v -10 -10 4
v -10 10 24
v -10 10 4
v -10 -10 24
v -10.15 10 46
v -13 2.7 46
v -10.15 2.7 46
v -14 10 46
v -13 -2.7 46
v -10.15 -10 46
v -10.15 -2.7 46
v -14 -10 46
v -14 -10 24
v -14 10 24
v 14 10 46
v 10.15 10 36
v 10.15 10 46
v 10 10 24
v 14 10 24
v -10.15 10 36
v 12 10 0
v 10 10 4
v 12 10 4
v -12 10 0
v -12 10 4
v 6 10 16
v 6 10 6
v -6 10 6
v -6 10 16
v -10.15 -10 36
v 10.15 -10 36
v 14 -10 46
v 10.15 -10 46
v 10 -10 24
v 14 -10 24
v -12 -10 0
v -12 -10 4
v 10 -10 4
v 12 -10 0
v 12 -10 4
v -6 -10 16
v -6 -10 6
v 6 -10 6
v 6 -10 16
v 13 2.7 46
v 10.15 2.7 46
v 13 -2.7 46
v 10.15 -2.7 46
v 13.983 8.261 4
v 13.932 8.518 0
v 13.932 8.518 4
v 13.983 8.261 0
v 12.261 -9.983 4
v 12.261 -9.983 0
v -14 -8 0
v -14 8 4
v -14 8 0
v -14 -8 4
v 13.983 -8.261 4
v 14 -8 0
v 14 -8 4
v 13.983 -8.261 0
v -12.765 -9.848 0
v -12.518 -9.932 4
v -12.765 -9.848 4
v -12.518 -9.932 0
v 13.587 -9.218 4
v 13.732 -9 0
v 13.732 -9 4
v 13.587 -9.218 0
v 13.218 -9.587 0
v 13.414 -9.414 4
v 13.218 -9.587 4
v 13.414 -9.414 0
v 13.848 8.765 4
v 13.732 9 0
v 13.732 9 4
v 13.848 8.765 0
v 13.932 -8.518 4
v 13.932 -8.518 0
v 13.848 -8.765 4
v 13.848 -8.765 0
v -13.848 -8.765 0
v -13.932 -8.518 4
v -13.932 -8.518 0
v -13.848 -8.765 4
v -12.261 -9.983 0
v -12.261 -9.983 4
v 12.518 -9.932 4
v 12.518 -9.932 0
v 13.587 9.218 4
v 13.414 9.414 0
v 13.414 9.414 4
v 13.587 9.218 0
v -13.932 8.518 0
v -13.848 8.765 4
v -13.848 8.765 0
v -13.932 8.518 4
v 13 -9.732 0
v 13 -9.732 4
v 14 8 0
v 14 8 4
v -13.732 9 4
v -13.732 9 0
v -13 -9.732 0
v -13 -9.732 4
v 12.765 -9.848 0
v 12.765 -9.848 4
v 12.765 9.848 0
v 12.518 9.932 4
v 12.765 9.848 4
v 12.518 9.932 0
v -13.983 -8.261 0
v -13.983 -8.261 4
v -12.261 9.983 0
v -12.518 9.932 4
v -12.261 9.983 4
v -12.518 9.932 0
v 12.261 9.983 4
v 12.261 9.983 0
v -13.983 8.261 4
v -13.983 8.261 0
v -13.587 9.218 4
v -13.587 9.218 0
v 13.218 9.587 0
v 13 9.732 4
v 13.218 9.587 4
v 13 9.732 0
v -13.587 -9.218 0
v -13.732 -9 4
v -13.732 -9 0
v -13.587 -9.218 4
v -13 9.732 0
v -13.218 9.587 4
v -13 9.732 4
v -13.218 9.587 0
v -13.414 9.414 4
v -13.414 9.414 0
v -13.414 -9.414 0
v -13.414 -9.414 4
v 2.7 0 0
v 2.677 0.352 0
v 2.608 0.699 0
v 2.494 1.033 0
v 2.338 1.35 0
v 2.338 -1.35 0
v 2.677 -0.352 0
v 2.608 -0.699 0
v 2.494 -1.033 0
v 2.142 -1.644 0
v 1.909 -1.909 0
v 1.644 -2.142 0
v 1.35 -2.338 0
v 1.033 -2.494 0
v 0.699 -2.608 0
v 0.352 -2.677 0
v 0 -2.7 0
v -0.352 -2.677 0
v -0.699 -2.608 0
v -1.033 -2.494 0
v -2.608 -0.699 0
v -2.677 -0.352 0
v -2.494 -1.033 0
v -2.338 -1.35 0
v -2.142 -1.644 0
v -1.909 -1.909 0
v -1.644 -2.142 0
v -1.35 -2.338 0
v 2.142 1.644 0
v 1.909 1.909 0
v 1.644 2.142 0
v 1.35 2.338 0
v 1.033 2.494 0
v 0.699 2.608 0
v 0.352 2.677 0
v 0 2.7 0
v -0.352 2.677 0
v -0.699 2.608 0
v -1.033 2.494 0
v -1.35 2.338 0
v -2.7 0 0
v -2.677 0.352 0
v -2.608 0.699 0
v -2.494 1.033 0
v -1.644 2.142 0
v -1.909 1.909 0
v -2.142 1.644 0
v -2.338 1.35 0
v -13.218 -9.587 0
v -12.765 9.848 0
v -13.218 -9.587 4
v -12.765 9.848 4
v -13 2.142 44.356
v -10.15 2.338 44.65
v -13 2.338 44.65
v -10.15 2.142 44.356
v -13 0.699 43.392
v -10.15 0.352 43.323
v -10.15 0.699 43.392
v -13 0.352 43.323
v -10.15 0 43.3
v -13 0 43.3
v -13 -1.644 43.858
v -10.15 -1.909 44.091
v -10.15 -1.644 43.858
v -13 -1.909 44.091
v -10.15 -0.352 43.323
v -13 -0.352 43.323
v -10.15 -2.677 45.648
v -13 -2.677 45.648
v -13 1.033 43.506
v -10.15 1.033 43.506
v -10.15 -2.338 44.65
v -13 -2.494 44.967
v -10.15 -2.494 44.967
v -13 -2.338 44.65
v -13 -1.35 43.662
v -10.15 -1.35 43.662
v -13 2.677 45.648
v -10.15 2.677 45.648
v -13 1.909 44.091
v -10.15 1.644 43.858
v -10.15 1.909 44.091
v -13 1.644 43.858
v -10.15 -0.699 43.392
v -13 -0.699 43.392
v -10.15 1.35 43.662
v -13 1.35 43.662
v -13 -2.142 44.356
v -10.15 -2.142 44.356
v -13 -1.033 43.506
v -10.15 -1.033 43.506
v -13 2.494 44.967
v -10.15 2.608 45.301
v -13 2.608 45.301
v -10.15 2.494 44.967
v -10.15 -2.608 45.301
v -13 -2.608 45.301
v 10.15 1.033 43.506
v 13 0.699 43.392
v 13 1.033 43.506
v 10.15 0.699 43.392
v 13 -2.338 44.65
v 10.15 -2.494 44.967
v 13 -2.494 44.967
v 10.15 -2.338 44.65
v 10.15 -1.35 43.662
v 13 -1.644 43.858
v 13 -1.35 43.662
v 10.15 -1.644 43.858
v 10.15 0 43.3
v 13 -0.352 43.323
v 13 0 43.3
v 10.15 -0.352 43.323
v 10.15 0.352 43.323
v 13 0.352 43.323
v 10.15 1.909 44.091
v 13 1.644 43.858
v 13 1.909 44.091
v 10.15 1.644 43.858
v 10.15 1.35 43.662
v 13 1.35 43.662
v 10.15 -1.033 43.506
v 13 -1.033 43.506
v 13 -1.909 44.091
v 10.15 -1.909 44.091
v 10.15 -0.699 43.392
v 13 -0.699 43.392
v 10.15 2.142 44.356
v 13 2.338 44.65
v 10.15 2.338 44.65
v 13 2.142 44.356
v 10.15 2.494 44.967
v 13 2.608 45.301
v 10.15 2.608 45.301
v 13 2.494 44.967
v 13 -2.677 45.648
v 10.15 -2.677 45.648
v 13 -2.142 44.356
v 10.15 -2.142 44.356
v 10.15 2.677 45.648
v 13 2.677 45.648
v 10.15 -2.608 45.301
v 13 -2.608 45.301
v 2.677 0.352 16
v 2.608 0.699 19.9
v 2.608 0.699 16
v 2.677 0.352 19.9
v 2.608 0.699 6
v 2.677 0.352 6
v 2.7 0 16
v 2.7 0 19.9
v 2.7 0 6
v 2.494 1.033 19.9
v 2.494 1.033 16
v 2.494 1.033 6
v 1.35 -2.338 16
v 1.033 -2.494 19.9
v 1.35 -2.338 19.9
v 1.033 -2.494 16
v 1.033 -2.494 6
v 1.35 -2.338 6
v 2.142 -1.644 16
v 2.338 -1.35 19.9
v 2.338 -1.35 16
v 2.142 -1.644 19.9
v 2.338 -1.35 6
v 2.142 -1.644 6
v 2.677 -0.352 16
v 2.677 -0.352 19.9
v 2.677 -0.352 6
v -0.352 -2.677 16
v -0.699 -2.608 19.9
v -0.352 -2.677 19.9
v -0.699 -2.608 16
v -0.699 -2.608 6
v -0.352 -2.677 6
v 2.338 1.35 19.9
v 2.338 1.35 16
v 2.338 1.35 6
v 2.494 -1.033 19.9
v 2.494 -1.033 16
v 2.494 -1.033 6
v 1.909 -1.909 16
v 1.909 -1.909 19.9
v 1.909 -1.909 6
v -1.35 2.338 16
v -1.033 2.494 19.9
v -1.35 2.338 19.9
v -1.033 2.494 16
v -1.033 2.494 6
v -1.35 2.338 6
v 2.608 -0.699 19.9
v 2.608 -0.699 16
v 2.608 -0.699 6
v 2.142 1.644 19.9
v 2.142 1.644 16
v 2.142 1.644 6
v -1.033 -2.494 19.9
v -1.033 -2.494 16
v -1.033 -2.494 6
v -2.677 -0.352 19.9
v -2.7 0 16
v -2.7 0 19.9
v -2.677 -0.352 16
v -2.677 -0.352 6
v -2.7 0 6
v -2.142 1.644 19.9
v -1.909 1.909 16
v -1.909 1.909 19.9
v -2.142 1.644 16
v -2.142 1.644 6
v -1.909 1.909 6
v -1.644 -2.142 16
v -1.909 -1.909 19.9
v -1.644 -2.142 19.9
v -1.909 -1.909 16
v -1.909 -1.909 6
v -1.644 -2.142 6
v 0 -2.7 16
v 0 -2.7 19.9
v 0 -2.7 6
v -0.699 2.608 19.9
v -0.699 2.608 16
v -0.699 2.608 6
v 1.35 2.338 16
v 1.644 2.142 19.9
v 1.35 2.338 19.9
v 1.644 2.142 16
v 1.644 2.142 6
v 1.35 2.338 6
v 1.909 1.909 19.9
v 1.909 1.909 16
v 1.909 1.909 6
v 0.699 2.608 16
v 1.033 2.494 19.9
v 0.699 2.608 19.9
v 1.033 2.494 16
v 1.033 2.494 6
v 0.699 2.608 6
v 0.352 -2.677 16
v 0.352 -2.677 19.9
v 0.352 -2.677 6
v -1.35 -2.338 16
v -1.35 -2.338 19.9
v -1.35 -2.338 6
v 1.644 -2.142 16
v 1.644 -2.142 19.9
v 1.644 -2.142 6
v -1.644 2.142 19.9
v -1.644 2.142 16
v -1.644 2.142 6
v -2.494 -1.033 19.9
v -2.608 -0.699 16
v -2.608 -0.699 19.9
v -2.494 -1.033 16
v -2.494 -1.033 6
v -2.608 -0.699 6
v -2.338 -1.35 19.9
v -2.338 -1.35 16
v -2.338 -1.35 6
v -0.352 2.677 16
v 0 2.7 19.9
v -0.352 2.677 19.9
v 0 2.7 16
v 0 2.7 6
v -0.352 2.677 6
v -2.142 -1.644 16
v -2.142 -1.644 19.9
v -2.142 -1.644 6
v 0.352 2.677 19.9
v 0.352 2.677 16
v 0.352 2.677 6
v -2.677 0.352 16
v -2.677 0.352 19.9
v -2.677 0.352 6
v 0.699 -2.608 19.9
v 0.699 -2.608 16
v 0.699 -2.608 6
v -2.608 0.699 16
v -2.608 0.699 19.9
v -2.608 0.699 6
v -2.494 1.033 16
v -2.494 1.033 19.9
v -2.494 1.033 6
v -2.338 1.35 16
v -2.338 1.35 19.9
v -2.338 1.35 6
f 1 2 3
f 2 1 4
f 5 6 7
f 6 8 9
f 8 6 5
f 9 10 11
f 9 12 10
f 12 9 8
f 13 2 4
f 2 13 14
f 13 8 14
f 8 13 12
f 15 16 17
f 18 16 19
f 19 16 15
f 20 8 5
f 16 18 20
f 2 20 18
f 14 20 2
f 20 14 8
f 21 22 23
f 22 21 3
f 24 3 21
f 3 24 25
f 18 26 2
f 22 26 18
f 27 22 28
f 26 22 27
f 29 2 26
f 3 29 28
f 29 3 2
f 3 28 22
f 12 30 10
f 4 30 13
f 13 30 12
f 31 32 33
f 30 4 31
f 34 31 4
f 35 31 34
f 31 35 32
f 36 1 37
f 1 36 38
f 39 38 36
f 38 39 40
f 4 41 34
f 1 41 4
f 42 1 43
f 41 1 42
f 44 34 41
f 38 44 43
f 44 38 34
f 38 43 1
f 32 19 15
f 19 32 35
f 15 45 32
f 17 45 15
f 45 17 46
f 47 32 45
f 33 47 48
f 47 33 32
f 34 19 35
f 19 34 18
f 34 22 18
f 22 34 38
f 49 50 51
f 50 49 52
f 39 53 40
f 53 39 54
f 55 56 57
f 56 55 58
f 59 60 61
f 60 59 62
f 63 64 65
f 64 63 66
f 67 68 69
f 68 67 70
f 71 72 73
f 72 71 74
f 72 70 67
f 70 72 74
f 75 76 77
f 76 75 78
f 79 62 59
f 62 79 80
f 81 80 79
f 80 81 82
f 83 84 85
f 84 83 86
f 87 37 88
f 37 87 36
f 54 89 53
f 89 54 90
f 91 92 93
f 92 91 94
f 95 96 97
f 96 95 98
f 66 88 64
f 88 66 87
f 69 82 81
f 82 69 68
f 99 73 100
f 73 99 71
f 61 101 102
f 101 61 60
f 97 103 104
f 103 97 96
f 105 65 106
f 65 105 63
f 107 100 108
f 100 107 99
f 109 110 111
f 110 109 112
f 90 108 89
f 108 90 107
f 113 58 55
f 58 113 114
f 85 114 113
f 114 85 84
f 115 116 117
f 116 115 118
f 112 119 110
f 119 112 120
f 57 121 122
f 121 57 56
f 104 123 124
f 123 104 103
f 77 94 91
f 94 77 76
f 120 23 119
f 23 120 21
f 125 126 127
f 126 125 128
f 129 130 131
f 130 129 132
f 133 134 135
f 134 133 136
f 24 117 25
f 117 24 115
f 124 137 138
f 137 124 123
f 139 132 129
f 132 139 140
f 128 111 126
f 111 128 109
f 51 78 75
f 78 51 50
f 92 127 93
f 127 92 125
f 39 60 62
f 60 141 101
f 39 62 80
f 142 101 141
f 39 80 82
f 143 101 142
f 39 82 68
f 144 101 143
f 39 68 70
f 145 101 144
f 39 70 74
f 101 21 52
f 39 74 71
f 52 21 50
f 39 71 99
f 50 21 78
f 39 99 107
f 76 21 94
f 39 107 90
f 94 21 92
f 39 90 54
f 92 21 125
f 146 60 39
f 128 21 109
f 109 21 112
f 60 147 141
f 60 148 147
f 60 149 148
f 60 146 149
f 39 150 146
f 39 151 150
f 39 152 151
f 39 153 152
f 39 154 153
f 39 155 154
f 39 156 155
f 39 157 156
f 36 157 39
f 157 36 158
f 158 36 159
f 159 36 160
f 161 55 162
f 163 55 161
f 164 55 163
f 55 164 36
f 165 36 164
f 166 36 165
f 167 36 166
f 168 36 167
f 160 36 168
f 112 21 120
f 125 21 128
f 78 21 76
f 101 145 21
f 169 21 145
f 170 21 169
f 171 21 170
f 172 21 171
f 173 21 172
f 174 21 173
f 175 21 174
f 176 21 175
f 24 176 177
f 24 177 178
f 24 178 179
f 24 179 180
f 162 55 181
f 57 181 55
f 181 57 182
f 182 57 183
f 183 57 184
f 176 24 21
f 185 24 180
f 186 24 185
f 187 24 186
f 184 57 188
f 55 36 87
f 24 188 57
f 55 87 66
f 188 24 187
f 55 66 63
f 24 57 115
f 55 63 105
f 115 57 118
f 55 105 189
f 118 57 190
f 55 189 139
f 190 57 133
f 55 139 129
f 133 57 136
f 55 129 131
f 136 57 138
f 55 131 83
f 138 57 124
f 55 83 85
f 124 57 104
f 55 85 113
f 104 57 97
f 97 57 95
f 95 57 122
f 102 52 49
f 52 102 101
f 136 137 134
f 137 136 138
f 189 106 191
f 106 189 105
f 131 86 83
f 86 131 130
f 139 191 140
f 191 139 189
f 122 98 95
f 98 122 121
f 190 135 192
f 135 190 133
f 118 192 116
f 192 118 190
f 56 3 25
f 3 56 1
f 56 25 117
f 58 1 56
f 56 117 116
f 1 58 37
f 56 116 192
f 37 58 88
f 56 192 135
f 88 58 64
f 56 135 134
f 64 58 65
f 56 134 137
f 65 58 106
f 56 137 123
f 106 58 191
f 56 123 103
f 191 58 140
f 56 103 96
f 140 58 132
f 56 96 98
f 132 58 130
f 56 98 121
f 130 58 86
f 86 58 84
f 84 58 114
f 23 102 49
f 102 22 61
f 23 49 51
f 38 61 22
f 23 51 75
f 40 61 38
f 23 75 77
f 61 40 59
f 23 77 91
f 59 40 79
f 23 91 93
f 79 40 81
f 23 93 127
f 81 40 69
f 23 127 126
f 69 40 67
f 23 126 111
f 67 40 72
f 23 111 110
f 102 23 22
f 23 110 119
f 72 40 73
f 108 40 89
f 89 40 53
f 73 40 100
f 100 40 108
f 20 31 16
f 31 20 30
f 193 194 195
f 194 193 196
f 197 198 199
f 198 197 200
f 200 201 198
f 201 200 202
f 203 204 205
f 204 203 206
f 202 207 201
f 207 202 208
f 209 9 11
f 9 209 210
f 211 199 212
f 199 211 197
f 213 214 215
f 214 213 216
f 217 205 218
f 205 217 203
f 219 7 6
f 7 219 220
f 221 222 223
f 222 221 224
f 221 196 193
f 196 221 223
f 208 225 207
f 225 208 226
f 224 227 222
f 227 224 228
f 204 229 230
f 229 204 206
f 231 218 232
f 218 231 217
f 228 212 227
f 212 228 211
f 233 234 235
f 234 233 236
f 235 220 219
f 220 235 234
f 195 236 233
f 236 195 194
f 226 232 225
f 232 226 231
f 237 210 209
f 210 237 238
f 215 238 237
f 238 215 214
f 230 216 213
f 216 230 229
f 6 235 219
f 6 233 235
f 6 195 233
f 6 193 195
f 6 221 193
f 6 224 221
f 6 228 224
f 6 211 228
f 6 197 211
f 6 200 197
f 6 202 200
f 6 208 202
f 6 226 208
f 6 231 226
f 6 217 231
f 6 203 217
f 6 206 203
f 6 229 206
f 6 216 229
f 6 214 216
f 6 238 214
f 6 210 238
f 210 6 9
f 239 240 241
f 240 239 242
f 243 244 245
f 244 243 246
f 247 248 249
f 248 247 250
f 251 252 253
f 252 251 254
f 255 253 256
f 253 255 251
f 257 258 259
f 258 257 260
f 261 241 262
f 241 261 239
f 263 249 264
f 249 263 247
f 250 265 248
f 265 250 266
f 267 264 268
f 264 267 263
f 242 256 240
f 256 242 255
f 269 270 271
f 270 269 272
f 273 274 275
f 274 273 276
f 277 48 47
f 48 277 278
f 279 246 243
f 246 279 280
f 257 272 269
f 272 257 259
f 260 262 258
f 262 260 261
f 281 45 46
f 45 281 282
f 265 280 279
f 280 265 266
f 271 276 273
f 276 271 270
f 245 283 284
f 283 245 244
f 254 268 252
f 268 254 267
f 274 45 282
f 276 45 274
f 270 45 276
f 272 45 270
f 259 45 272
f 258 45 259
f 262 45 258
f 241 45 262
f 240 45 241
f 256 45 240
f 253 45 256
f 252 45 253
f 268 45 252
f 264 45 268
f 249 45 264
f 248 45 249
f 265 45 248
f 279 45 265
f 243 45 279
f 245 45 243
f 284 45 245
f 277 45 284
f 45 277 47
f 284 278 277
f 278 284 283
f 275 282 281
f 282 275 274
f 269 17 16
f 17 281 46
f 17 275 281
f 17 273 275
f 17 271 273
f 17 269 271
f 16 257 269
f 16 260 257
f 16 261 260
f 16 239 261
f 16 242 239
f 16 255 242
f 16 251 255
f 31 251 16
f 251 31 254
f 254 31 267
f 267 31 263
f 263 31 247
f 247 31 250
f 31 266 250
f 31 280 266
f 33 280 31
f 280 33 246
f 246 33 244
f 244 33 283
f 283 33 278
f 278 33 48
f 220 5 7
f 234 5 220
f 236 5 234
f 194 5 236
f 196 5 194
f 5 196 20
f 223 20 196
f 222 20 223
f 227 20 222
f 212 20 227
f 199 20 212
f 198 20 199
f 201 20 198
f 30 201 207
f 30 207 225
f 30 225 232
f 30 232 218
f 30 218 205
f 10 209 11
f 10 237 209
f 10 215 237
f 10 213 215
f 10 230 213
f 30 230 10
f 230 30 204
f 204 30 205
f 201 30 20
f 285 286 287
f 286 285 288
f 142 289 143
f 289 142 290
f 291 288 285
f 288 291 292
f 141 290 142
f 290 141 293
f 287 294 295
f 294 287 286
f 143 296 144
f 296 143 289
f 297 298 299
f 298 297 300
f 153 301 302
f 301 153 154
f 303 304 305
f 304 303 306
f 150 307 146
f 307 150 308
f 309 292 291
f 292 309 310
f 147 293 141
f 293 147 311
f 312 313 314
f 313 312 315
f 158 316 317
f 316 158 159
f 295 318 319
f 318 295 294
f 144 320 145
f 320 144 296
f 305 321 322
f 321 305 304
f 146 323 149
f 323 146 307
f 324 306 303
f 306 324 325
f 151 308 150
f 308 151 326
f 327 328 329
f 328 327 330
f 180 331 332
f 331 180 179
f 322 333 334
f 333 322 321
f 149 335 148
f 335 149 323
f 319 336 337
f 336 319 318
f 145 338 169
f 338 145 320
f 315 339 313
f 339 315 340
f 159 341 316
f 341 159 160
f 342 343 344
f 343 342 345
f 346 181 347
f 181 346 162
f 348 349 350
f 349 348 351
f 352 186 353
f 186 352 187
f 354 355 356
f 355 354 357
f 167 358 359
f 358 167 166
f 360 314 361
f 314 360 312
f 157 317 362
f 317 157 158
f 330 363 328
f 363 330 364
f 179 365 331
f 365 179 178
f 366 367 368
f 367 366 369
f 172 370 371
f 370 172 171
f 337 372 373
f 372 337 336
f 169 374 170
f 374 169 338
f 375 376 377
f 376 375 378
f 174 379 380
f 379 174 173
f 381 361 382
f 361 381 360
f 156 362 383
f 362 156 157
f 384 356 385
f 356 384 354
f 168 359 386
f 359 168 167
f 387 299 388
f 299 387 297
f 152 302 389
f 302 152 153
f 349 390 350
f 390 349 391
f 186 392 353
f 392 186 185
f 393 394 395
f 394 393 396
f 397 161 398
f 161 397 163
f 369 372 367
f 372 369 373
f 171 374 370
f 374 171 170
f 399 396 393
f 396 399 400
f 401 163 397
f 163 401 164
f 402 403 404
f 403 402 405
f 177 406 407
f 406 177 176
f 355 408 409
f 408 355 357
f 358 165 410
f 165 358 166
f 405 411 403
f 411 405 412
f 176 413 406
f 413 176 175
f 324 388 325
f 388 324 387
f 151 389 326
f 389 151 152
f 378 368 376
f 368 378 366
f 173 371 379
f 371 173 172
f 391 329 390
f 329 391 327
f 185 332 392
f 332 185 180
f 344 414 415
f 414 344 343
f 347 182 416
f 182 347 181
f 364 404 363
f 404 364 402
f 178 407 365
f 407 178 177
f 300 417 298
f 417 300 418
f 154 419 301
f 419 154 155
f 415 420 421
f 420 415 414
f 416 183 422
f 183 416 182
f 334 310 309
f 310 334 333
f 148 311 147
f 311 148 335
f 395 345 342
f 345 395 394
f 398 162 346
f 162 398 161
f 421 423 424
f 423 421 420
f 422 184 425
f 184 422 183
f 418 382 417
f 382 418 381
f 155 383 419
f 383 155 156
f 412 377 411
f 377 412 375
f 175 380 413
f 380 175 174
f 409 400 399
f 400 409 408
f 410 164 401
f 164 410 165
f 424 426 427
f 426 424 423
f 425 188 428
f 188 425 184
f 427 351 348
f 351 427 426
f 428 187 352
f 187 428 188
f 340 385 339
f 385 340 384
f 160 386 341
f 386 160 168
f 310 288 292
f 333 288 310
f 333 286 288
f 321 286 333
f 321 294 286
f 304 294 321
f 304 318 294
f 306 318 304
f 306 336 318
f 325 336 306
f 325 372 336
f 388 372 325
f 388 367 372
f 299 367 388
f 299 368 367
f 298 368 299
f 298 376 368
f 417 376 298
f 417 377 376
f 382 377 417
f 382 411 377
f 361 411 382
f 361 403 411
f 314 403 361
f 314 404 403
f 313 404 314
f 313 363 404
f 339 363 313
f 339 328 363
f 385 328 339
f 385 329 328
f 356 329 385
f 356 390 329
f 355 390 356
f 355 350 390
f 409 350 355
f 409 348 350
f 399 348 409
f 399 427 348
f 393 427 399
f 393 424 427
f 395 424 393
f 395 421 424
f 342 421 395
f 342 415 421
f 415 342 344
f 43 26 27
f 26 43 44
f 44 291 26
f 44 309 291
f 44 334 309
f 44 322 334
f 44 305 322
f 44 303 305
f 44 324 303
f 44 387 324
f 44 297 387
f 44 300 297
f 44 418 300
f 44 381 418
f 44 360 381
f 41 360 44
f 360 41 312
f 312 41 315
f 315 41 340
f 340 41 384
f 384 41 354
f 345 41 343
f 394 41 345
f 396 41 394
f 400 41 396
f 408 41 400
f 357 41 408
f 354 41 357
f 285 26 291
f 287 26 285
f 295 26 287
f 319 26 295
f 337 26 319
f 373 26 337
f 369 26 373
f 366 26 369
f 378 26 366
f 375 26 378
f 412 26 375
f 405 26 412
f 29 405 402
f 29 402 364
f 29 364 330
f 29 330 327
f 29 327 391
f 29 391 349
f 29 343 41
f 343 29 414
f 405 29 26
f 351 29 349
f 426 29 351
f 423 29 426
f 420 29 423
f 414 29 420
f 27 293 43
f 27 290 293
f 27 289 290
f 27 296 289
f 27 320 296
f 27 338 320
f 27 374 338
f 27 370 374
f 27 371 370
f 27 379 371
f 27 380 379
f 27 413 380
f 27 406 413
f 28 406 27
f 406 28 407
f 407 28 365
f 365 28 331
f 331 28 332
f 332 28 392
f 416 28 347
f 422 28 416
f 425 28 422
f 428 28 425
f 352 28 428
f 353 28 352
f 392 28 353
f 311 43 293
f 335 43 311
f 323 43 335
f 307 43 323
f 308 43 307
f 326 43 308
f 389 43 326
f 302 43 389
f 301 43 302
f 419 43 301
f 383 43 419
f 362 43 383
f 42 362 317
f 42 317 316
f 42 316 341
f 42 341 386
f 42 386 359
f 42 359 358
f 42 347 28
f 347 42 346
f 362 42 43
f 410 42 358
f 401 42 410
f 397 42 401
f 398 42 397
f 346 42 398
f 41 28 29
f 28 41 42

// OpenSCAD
// file: lib/comun.scad
// =====================================================================
// AutoSwapEnder3Pro - parametros y utilidades comunes de las piezas
// Licencia MIT. Unidades: milimetros.
//
// Sistema de coordenadas de la ESTACION (el mismo en todas las piezas que
// se montan en ella):
//   s : a lo largo de la estacion, 0 = HOME del carro, crece hacia la impresora
//   x : a lo ancho, 0 = eje central (riel lineal), +x = lado de la caja de descarga
//   z : vertical, 0 = cara superior de la base de perfiles 2020 ("b" en la guia)
// El plano de transferencia (superficie por la que se deslizan las placas)
// esta en z = PLANO. Se ajusta a la altura de la cama de la impresora con las
// patas niveladoras, NO cambiando estas piezas.
// =====================================================================

$fn = 48;

// ----------------------------------------------------- placas y cama
placa_ancho  = 235;     // placa PEI
placa_largo  = 235;
placa_esp    = 0.6;     // espesor real de tus placas (mide con calibrador; 0.5 a 0.75)
voladizo     = 11;      // cuanto sobresale la placa (o su lengüeta) por delante de la cama

// ----------------------------------------------------- estacion (alturas sobre la base)
PLANO        = 60;      // plano de transferencia sobre la cara superior de la base
RIEL_SUP     = 20;      // cara superior del riel lineal (2020 apoyado en los travesaños)
ZP           = PLANO - RIEL_SUP;  // = 40: plano de transferencia sobre el riel lineal

// zapata (debe coincidir con zapata.scad)
zapata_bajo  = 8;       // cuanto cuelga la zapata por debajo de la placa
zapata_bolsillo = 6;    // profundidad del bolsillo para el dedo (desde abajo)

// cargador (ascensor)
paso_estante = 14;      // distancia vertical entre placas en el cargador
niveles      = 6;       // placas que caben en el cargador

// ----------------------------------------------------- perfil y tornilleria
perfil      = 20;       // perfil de aluminio 2020
ranura_ancho = 6.2;     // boca de la ranura (serie 20)
holgura     = 0.3;      // holgura general de impresion

m2_paso     = 1.8;   // agujero para autorroscante M2 (servos)
m3          = 3.4;   // paso libre M3
m3_rosca    = 2.7;   // para roscar M3 directamente en plastico
m3_tuerca   = 5.7;   // M3: entre caras + holgura
m3_tuerca_h = 2.6;
m3_cabeza   = 6.2;
m4          = 4.4;
m5          = 5.4;   // paso libre M5
m5_cabeza   = 9.2;
m5_tuerca   = 8.2;   // M5: entre caras + holgura

// ruedas en V estandar (Openbuilds "Solid V Wheel" + rodamientos 625)
rueda_d      = 23.9;
rueda_ancho  = 10.2;
rueda_sep    = 39.26;   // distancia entre centros de ruedas a ambos lados de un 2020
excentrica_d = 7.2;     // alojamiento del espaciador excentrico
espaciador_h = 6;       // espaciador (excentrico o fijo) entre rueda y placa

// ----------------------------------------------------- utilidades

// Caja con aristas verticales redondeadas (r) apoyada en z=0.
module caja_r(size, r = 2) {
  r2 = min(r, size[0] / 2 - 0.01, size[1] / 2 - 0.01);
  hull() for (ix = [r2, size[0] - r2], iy = [r2, size[1] - r2])
    translate([ix, iy, 0]) cylinder(r = r2, h = size[2]);
}

// Igual pero centrada en x e y.
module caja_rc(size, r = 2) { translate([-size[0] / 2, -size[1] / 2, 0]) caja_r(size, r); }

// Prisma hexagonal para tuercas (ec = medida entre caras).
module hexagono(ec, h) { cylinder(d = ec / cos(30), h = h, $fn = 6); }

// Ranura (agujero alargado) a lo largo de x.
module ranura(largo, d, h) {
  hull() for (i = [-largo / 2, largo / 2]) translate([i, 0, 0]) cylinder(d = d, h = h);
}

// Taladro M5 con avellanado para la cabeza (para atornillar a un perfil con tuerca en T).
module taladro_m5(h, cabeza = 4) {
  translate([0, 0, -0.1]) cylinder(d = m5, h = h + 0.2);
  translate([0, 0, h - cabeza]) cylinder(d = m5_cabeza + 0.6, h = cabeza + 0.1);
}

// Taladro M3 pasante con alojamiento de tuerca hexagonal por debajo.
module taladro_m3_tuerca(h, prof_tuerca = m3_tuerca_h + 0.2) {
  translate([0, 0, -0.1]) cylinder(d = m3, h = h + 0.2);
  translate([0, 0, -0.1]) hexagono(m3_tuerca, prof_tuerca + 0.1);
}

// Perfil 2020 de referencia (solo para ensamble y comprobaciones visuales).
module perfil2020(largo) {
  difference() {
    translate([-10, -10, 0]) cube([20, 20, largo]);
    for (a = [0, 90, 180, 270]) rotate([0, 0, a])
      translate([10 - 1.8, -ranura_ancho / 2, -1]) cube([2, ranura_ancho, largo + 2]);
    translate([0, 0, -1]) cylinder(d = 4.2, h = largo + 2);
  }
}

// Microinterruptor KW11-3Z con palanca de rodillo (referencia: 20 x 6.4 x 10 mm,
// taladros M2 a 9.5 mm). Agujeros de montaje, con la cara de montaje en z=0.
module taladros_kw11(h = 10) {
  for (i = [-4.75, 4.75]) translate([i, 0, -0.1]) cylinder(d = 2.2, h = h + 0.2);
}
// main file
// =====================================================================
// PEDESTALES de la zona de descarga (sobre los travesaños de la base)
// Material: PETG. 4 perimetros, 40 %. Imprimir como sale el STL.
//   pieza = "riel"    : sostiene el perfil 2020 del riel derecho (cara superior a
//                       PLANO - 4 mm). Imprimir 3 (travesaños s = 270, 400, 540).
//   pieza = "bisagra" : sostiene el eje del volteador (tornillo M5 x 30 que entra
//                       en el tubo de la bisagra) y tiene un tope donde descansa
//                       el volteador cerrado. Imprimir 2 (s = 270 y s = 540).
//   pieza = "calza"   : suplemento de 5 mm para el riel lineal (si hiciera falta).
// Coordenadas: z = 0 cara superior del travesaño.
// =====================================================================
include <lib/comun.scad>

pieza = "riel";  // "riel" | "bisagra" | "calza"

module pedestal_riel() {
  alto = PLANO - 4 - 20;   // = 36: el perfil 2020 apoya encima
  difference() {
    union() {
      translate([-14, -10, 0]) caja_r([28, 20, 4], 2);   // pie
      translate([-10, -10, 0]) cube([20, 20, alto]);    // columna
      // mejillas que abrazan el perfil
      for (sx = [-1, 1]) translate([sx > 0 ? 10 : -14, -10, alto - 12]) cube([4, 20, 22]);
    }
    // perfil 2020 encima
    translate([-10.15, -11, alto]) cube([20.3, 22, 30]);
    // M5 vertical al travesaño (cabeza dentro de la columna, acceso por la ventana)
    translate([0, 0, -0.1]) cylinder(d = m5, h = 20);
    translate([-6, -11, 6]) cube([12, 22, 10]);
    // M5 horizontales a las ranuras laterales del perfil
    for (sx = [-1, 1]) translate([sx * 8, 0, alto + 10]) rotate([0, 90, 0]) cylinder(d = m5, h = 10, center = true);
  }
}

module pedestal_bisagra() {
  eje_z = PLANO - 12;   // = 48: eje del volteador (x = 0 aqui = x -128 de la estacion)
  difference() {
    union() {
      translate([-15, -5, 0]) caja_r([36, 10, 4], 2);
      hull() {
        translate([-8, -5, 0]) cube([16, 10, 1]);
        translate([0, -5, eje_z]) rotate([-90, 0, 0]) cylinder(d = 14, h = 10);
      }
      // repisa de tope: la oreja del volteador cerrado apoya encima (z = PLANO - 8)
      hull() {
        translate([4, -5, 0]) cube([4, 10, 1]);
        translate([6, -5, PLANO - 16]) cube([10, 10, 8]);
      }
    }
    translate([0, -6, eje_z]) rotate([-90, 0, 0]) cylinder(d = m5, h = 12);
    for (sx = [-10, 14]) translate([sx, 0, -0.1]) cylinder(d = m5, h = 5);
  }
}

module calza() {
  difference() {
    caja_rc([20, 40, 5], 2);
    for (sy = [-12, 12]) translate([0, sy, -0.1]) cylinder(d = m5, h = 6);
  }
}

if (pieza == "riel") pedestal_riel();
else if (pieza == "bisagra") pedestal_bisagra();
else calza();
